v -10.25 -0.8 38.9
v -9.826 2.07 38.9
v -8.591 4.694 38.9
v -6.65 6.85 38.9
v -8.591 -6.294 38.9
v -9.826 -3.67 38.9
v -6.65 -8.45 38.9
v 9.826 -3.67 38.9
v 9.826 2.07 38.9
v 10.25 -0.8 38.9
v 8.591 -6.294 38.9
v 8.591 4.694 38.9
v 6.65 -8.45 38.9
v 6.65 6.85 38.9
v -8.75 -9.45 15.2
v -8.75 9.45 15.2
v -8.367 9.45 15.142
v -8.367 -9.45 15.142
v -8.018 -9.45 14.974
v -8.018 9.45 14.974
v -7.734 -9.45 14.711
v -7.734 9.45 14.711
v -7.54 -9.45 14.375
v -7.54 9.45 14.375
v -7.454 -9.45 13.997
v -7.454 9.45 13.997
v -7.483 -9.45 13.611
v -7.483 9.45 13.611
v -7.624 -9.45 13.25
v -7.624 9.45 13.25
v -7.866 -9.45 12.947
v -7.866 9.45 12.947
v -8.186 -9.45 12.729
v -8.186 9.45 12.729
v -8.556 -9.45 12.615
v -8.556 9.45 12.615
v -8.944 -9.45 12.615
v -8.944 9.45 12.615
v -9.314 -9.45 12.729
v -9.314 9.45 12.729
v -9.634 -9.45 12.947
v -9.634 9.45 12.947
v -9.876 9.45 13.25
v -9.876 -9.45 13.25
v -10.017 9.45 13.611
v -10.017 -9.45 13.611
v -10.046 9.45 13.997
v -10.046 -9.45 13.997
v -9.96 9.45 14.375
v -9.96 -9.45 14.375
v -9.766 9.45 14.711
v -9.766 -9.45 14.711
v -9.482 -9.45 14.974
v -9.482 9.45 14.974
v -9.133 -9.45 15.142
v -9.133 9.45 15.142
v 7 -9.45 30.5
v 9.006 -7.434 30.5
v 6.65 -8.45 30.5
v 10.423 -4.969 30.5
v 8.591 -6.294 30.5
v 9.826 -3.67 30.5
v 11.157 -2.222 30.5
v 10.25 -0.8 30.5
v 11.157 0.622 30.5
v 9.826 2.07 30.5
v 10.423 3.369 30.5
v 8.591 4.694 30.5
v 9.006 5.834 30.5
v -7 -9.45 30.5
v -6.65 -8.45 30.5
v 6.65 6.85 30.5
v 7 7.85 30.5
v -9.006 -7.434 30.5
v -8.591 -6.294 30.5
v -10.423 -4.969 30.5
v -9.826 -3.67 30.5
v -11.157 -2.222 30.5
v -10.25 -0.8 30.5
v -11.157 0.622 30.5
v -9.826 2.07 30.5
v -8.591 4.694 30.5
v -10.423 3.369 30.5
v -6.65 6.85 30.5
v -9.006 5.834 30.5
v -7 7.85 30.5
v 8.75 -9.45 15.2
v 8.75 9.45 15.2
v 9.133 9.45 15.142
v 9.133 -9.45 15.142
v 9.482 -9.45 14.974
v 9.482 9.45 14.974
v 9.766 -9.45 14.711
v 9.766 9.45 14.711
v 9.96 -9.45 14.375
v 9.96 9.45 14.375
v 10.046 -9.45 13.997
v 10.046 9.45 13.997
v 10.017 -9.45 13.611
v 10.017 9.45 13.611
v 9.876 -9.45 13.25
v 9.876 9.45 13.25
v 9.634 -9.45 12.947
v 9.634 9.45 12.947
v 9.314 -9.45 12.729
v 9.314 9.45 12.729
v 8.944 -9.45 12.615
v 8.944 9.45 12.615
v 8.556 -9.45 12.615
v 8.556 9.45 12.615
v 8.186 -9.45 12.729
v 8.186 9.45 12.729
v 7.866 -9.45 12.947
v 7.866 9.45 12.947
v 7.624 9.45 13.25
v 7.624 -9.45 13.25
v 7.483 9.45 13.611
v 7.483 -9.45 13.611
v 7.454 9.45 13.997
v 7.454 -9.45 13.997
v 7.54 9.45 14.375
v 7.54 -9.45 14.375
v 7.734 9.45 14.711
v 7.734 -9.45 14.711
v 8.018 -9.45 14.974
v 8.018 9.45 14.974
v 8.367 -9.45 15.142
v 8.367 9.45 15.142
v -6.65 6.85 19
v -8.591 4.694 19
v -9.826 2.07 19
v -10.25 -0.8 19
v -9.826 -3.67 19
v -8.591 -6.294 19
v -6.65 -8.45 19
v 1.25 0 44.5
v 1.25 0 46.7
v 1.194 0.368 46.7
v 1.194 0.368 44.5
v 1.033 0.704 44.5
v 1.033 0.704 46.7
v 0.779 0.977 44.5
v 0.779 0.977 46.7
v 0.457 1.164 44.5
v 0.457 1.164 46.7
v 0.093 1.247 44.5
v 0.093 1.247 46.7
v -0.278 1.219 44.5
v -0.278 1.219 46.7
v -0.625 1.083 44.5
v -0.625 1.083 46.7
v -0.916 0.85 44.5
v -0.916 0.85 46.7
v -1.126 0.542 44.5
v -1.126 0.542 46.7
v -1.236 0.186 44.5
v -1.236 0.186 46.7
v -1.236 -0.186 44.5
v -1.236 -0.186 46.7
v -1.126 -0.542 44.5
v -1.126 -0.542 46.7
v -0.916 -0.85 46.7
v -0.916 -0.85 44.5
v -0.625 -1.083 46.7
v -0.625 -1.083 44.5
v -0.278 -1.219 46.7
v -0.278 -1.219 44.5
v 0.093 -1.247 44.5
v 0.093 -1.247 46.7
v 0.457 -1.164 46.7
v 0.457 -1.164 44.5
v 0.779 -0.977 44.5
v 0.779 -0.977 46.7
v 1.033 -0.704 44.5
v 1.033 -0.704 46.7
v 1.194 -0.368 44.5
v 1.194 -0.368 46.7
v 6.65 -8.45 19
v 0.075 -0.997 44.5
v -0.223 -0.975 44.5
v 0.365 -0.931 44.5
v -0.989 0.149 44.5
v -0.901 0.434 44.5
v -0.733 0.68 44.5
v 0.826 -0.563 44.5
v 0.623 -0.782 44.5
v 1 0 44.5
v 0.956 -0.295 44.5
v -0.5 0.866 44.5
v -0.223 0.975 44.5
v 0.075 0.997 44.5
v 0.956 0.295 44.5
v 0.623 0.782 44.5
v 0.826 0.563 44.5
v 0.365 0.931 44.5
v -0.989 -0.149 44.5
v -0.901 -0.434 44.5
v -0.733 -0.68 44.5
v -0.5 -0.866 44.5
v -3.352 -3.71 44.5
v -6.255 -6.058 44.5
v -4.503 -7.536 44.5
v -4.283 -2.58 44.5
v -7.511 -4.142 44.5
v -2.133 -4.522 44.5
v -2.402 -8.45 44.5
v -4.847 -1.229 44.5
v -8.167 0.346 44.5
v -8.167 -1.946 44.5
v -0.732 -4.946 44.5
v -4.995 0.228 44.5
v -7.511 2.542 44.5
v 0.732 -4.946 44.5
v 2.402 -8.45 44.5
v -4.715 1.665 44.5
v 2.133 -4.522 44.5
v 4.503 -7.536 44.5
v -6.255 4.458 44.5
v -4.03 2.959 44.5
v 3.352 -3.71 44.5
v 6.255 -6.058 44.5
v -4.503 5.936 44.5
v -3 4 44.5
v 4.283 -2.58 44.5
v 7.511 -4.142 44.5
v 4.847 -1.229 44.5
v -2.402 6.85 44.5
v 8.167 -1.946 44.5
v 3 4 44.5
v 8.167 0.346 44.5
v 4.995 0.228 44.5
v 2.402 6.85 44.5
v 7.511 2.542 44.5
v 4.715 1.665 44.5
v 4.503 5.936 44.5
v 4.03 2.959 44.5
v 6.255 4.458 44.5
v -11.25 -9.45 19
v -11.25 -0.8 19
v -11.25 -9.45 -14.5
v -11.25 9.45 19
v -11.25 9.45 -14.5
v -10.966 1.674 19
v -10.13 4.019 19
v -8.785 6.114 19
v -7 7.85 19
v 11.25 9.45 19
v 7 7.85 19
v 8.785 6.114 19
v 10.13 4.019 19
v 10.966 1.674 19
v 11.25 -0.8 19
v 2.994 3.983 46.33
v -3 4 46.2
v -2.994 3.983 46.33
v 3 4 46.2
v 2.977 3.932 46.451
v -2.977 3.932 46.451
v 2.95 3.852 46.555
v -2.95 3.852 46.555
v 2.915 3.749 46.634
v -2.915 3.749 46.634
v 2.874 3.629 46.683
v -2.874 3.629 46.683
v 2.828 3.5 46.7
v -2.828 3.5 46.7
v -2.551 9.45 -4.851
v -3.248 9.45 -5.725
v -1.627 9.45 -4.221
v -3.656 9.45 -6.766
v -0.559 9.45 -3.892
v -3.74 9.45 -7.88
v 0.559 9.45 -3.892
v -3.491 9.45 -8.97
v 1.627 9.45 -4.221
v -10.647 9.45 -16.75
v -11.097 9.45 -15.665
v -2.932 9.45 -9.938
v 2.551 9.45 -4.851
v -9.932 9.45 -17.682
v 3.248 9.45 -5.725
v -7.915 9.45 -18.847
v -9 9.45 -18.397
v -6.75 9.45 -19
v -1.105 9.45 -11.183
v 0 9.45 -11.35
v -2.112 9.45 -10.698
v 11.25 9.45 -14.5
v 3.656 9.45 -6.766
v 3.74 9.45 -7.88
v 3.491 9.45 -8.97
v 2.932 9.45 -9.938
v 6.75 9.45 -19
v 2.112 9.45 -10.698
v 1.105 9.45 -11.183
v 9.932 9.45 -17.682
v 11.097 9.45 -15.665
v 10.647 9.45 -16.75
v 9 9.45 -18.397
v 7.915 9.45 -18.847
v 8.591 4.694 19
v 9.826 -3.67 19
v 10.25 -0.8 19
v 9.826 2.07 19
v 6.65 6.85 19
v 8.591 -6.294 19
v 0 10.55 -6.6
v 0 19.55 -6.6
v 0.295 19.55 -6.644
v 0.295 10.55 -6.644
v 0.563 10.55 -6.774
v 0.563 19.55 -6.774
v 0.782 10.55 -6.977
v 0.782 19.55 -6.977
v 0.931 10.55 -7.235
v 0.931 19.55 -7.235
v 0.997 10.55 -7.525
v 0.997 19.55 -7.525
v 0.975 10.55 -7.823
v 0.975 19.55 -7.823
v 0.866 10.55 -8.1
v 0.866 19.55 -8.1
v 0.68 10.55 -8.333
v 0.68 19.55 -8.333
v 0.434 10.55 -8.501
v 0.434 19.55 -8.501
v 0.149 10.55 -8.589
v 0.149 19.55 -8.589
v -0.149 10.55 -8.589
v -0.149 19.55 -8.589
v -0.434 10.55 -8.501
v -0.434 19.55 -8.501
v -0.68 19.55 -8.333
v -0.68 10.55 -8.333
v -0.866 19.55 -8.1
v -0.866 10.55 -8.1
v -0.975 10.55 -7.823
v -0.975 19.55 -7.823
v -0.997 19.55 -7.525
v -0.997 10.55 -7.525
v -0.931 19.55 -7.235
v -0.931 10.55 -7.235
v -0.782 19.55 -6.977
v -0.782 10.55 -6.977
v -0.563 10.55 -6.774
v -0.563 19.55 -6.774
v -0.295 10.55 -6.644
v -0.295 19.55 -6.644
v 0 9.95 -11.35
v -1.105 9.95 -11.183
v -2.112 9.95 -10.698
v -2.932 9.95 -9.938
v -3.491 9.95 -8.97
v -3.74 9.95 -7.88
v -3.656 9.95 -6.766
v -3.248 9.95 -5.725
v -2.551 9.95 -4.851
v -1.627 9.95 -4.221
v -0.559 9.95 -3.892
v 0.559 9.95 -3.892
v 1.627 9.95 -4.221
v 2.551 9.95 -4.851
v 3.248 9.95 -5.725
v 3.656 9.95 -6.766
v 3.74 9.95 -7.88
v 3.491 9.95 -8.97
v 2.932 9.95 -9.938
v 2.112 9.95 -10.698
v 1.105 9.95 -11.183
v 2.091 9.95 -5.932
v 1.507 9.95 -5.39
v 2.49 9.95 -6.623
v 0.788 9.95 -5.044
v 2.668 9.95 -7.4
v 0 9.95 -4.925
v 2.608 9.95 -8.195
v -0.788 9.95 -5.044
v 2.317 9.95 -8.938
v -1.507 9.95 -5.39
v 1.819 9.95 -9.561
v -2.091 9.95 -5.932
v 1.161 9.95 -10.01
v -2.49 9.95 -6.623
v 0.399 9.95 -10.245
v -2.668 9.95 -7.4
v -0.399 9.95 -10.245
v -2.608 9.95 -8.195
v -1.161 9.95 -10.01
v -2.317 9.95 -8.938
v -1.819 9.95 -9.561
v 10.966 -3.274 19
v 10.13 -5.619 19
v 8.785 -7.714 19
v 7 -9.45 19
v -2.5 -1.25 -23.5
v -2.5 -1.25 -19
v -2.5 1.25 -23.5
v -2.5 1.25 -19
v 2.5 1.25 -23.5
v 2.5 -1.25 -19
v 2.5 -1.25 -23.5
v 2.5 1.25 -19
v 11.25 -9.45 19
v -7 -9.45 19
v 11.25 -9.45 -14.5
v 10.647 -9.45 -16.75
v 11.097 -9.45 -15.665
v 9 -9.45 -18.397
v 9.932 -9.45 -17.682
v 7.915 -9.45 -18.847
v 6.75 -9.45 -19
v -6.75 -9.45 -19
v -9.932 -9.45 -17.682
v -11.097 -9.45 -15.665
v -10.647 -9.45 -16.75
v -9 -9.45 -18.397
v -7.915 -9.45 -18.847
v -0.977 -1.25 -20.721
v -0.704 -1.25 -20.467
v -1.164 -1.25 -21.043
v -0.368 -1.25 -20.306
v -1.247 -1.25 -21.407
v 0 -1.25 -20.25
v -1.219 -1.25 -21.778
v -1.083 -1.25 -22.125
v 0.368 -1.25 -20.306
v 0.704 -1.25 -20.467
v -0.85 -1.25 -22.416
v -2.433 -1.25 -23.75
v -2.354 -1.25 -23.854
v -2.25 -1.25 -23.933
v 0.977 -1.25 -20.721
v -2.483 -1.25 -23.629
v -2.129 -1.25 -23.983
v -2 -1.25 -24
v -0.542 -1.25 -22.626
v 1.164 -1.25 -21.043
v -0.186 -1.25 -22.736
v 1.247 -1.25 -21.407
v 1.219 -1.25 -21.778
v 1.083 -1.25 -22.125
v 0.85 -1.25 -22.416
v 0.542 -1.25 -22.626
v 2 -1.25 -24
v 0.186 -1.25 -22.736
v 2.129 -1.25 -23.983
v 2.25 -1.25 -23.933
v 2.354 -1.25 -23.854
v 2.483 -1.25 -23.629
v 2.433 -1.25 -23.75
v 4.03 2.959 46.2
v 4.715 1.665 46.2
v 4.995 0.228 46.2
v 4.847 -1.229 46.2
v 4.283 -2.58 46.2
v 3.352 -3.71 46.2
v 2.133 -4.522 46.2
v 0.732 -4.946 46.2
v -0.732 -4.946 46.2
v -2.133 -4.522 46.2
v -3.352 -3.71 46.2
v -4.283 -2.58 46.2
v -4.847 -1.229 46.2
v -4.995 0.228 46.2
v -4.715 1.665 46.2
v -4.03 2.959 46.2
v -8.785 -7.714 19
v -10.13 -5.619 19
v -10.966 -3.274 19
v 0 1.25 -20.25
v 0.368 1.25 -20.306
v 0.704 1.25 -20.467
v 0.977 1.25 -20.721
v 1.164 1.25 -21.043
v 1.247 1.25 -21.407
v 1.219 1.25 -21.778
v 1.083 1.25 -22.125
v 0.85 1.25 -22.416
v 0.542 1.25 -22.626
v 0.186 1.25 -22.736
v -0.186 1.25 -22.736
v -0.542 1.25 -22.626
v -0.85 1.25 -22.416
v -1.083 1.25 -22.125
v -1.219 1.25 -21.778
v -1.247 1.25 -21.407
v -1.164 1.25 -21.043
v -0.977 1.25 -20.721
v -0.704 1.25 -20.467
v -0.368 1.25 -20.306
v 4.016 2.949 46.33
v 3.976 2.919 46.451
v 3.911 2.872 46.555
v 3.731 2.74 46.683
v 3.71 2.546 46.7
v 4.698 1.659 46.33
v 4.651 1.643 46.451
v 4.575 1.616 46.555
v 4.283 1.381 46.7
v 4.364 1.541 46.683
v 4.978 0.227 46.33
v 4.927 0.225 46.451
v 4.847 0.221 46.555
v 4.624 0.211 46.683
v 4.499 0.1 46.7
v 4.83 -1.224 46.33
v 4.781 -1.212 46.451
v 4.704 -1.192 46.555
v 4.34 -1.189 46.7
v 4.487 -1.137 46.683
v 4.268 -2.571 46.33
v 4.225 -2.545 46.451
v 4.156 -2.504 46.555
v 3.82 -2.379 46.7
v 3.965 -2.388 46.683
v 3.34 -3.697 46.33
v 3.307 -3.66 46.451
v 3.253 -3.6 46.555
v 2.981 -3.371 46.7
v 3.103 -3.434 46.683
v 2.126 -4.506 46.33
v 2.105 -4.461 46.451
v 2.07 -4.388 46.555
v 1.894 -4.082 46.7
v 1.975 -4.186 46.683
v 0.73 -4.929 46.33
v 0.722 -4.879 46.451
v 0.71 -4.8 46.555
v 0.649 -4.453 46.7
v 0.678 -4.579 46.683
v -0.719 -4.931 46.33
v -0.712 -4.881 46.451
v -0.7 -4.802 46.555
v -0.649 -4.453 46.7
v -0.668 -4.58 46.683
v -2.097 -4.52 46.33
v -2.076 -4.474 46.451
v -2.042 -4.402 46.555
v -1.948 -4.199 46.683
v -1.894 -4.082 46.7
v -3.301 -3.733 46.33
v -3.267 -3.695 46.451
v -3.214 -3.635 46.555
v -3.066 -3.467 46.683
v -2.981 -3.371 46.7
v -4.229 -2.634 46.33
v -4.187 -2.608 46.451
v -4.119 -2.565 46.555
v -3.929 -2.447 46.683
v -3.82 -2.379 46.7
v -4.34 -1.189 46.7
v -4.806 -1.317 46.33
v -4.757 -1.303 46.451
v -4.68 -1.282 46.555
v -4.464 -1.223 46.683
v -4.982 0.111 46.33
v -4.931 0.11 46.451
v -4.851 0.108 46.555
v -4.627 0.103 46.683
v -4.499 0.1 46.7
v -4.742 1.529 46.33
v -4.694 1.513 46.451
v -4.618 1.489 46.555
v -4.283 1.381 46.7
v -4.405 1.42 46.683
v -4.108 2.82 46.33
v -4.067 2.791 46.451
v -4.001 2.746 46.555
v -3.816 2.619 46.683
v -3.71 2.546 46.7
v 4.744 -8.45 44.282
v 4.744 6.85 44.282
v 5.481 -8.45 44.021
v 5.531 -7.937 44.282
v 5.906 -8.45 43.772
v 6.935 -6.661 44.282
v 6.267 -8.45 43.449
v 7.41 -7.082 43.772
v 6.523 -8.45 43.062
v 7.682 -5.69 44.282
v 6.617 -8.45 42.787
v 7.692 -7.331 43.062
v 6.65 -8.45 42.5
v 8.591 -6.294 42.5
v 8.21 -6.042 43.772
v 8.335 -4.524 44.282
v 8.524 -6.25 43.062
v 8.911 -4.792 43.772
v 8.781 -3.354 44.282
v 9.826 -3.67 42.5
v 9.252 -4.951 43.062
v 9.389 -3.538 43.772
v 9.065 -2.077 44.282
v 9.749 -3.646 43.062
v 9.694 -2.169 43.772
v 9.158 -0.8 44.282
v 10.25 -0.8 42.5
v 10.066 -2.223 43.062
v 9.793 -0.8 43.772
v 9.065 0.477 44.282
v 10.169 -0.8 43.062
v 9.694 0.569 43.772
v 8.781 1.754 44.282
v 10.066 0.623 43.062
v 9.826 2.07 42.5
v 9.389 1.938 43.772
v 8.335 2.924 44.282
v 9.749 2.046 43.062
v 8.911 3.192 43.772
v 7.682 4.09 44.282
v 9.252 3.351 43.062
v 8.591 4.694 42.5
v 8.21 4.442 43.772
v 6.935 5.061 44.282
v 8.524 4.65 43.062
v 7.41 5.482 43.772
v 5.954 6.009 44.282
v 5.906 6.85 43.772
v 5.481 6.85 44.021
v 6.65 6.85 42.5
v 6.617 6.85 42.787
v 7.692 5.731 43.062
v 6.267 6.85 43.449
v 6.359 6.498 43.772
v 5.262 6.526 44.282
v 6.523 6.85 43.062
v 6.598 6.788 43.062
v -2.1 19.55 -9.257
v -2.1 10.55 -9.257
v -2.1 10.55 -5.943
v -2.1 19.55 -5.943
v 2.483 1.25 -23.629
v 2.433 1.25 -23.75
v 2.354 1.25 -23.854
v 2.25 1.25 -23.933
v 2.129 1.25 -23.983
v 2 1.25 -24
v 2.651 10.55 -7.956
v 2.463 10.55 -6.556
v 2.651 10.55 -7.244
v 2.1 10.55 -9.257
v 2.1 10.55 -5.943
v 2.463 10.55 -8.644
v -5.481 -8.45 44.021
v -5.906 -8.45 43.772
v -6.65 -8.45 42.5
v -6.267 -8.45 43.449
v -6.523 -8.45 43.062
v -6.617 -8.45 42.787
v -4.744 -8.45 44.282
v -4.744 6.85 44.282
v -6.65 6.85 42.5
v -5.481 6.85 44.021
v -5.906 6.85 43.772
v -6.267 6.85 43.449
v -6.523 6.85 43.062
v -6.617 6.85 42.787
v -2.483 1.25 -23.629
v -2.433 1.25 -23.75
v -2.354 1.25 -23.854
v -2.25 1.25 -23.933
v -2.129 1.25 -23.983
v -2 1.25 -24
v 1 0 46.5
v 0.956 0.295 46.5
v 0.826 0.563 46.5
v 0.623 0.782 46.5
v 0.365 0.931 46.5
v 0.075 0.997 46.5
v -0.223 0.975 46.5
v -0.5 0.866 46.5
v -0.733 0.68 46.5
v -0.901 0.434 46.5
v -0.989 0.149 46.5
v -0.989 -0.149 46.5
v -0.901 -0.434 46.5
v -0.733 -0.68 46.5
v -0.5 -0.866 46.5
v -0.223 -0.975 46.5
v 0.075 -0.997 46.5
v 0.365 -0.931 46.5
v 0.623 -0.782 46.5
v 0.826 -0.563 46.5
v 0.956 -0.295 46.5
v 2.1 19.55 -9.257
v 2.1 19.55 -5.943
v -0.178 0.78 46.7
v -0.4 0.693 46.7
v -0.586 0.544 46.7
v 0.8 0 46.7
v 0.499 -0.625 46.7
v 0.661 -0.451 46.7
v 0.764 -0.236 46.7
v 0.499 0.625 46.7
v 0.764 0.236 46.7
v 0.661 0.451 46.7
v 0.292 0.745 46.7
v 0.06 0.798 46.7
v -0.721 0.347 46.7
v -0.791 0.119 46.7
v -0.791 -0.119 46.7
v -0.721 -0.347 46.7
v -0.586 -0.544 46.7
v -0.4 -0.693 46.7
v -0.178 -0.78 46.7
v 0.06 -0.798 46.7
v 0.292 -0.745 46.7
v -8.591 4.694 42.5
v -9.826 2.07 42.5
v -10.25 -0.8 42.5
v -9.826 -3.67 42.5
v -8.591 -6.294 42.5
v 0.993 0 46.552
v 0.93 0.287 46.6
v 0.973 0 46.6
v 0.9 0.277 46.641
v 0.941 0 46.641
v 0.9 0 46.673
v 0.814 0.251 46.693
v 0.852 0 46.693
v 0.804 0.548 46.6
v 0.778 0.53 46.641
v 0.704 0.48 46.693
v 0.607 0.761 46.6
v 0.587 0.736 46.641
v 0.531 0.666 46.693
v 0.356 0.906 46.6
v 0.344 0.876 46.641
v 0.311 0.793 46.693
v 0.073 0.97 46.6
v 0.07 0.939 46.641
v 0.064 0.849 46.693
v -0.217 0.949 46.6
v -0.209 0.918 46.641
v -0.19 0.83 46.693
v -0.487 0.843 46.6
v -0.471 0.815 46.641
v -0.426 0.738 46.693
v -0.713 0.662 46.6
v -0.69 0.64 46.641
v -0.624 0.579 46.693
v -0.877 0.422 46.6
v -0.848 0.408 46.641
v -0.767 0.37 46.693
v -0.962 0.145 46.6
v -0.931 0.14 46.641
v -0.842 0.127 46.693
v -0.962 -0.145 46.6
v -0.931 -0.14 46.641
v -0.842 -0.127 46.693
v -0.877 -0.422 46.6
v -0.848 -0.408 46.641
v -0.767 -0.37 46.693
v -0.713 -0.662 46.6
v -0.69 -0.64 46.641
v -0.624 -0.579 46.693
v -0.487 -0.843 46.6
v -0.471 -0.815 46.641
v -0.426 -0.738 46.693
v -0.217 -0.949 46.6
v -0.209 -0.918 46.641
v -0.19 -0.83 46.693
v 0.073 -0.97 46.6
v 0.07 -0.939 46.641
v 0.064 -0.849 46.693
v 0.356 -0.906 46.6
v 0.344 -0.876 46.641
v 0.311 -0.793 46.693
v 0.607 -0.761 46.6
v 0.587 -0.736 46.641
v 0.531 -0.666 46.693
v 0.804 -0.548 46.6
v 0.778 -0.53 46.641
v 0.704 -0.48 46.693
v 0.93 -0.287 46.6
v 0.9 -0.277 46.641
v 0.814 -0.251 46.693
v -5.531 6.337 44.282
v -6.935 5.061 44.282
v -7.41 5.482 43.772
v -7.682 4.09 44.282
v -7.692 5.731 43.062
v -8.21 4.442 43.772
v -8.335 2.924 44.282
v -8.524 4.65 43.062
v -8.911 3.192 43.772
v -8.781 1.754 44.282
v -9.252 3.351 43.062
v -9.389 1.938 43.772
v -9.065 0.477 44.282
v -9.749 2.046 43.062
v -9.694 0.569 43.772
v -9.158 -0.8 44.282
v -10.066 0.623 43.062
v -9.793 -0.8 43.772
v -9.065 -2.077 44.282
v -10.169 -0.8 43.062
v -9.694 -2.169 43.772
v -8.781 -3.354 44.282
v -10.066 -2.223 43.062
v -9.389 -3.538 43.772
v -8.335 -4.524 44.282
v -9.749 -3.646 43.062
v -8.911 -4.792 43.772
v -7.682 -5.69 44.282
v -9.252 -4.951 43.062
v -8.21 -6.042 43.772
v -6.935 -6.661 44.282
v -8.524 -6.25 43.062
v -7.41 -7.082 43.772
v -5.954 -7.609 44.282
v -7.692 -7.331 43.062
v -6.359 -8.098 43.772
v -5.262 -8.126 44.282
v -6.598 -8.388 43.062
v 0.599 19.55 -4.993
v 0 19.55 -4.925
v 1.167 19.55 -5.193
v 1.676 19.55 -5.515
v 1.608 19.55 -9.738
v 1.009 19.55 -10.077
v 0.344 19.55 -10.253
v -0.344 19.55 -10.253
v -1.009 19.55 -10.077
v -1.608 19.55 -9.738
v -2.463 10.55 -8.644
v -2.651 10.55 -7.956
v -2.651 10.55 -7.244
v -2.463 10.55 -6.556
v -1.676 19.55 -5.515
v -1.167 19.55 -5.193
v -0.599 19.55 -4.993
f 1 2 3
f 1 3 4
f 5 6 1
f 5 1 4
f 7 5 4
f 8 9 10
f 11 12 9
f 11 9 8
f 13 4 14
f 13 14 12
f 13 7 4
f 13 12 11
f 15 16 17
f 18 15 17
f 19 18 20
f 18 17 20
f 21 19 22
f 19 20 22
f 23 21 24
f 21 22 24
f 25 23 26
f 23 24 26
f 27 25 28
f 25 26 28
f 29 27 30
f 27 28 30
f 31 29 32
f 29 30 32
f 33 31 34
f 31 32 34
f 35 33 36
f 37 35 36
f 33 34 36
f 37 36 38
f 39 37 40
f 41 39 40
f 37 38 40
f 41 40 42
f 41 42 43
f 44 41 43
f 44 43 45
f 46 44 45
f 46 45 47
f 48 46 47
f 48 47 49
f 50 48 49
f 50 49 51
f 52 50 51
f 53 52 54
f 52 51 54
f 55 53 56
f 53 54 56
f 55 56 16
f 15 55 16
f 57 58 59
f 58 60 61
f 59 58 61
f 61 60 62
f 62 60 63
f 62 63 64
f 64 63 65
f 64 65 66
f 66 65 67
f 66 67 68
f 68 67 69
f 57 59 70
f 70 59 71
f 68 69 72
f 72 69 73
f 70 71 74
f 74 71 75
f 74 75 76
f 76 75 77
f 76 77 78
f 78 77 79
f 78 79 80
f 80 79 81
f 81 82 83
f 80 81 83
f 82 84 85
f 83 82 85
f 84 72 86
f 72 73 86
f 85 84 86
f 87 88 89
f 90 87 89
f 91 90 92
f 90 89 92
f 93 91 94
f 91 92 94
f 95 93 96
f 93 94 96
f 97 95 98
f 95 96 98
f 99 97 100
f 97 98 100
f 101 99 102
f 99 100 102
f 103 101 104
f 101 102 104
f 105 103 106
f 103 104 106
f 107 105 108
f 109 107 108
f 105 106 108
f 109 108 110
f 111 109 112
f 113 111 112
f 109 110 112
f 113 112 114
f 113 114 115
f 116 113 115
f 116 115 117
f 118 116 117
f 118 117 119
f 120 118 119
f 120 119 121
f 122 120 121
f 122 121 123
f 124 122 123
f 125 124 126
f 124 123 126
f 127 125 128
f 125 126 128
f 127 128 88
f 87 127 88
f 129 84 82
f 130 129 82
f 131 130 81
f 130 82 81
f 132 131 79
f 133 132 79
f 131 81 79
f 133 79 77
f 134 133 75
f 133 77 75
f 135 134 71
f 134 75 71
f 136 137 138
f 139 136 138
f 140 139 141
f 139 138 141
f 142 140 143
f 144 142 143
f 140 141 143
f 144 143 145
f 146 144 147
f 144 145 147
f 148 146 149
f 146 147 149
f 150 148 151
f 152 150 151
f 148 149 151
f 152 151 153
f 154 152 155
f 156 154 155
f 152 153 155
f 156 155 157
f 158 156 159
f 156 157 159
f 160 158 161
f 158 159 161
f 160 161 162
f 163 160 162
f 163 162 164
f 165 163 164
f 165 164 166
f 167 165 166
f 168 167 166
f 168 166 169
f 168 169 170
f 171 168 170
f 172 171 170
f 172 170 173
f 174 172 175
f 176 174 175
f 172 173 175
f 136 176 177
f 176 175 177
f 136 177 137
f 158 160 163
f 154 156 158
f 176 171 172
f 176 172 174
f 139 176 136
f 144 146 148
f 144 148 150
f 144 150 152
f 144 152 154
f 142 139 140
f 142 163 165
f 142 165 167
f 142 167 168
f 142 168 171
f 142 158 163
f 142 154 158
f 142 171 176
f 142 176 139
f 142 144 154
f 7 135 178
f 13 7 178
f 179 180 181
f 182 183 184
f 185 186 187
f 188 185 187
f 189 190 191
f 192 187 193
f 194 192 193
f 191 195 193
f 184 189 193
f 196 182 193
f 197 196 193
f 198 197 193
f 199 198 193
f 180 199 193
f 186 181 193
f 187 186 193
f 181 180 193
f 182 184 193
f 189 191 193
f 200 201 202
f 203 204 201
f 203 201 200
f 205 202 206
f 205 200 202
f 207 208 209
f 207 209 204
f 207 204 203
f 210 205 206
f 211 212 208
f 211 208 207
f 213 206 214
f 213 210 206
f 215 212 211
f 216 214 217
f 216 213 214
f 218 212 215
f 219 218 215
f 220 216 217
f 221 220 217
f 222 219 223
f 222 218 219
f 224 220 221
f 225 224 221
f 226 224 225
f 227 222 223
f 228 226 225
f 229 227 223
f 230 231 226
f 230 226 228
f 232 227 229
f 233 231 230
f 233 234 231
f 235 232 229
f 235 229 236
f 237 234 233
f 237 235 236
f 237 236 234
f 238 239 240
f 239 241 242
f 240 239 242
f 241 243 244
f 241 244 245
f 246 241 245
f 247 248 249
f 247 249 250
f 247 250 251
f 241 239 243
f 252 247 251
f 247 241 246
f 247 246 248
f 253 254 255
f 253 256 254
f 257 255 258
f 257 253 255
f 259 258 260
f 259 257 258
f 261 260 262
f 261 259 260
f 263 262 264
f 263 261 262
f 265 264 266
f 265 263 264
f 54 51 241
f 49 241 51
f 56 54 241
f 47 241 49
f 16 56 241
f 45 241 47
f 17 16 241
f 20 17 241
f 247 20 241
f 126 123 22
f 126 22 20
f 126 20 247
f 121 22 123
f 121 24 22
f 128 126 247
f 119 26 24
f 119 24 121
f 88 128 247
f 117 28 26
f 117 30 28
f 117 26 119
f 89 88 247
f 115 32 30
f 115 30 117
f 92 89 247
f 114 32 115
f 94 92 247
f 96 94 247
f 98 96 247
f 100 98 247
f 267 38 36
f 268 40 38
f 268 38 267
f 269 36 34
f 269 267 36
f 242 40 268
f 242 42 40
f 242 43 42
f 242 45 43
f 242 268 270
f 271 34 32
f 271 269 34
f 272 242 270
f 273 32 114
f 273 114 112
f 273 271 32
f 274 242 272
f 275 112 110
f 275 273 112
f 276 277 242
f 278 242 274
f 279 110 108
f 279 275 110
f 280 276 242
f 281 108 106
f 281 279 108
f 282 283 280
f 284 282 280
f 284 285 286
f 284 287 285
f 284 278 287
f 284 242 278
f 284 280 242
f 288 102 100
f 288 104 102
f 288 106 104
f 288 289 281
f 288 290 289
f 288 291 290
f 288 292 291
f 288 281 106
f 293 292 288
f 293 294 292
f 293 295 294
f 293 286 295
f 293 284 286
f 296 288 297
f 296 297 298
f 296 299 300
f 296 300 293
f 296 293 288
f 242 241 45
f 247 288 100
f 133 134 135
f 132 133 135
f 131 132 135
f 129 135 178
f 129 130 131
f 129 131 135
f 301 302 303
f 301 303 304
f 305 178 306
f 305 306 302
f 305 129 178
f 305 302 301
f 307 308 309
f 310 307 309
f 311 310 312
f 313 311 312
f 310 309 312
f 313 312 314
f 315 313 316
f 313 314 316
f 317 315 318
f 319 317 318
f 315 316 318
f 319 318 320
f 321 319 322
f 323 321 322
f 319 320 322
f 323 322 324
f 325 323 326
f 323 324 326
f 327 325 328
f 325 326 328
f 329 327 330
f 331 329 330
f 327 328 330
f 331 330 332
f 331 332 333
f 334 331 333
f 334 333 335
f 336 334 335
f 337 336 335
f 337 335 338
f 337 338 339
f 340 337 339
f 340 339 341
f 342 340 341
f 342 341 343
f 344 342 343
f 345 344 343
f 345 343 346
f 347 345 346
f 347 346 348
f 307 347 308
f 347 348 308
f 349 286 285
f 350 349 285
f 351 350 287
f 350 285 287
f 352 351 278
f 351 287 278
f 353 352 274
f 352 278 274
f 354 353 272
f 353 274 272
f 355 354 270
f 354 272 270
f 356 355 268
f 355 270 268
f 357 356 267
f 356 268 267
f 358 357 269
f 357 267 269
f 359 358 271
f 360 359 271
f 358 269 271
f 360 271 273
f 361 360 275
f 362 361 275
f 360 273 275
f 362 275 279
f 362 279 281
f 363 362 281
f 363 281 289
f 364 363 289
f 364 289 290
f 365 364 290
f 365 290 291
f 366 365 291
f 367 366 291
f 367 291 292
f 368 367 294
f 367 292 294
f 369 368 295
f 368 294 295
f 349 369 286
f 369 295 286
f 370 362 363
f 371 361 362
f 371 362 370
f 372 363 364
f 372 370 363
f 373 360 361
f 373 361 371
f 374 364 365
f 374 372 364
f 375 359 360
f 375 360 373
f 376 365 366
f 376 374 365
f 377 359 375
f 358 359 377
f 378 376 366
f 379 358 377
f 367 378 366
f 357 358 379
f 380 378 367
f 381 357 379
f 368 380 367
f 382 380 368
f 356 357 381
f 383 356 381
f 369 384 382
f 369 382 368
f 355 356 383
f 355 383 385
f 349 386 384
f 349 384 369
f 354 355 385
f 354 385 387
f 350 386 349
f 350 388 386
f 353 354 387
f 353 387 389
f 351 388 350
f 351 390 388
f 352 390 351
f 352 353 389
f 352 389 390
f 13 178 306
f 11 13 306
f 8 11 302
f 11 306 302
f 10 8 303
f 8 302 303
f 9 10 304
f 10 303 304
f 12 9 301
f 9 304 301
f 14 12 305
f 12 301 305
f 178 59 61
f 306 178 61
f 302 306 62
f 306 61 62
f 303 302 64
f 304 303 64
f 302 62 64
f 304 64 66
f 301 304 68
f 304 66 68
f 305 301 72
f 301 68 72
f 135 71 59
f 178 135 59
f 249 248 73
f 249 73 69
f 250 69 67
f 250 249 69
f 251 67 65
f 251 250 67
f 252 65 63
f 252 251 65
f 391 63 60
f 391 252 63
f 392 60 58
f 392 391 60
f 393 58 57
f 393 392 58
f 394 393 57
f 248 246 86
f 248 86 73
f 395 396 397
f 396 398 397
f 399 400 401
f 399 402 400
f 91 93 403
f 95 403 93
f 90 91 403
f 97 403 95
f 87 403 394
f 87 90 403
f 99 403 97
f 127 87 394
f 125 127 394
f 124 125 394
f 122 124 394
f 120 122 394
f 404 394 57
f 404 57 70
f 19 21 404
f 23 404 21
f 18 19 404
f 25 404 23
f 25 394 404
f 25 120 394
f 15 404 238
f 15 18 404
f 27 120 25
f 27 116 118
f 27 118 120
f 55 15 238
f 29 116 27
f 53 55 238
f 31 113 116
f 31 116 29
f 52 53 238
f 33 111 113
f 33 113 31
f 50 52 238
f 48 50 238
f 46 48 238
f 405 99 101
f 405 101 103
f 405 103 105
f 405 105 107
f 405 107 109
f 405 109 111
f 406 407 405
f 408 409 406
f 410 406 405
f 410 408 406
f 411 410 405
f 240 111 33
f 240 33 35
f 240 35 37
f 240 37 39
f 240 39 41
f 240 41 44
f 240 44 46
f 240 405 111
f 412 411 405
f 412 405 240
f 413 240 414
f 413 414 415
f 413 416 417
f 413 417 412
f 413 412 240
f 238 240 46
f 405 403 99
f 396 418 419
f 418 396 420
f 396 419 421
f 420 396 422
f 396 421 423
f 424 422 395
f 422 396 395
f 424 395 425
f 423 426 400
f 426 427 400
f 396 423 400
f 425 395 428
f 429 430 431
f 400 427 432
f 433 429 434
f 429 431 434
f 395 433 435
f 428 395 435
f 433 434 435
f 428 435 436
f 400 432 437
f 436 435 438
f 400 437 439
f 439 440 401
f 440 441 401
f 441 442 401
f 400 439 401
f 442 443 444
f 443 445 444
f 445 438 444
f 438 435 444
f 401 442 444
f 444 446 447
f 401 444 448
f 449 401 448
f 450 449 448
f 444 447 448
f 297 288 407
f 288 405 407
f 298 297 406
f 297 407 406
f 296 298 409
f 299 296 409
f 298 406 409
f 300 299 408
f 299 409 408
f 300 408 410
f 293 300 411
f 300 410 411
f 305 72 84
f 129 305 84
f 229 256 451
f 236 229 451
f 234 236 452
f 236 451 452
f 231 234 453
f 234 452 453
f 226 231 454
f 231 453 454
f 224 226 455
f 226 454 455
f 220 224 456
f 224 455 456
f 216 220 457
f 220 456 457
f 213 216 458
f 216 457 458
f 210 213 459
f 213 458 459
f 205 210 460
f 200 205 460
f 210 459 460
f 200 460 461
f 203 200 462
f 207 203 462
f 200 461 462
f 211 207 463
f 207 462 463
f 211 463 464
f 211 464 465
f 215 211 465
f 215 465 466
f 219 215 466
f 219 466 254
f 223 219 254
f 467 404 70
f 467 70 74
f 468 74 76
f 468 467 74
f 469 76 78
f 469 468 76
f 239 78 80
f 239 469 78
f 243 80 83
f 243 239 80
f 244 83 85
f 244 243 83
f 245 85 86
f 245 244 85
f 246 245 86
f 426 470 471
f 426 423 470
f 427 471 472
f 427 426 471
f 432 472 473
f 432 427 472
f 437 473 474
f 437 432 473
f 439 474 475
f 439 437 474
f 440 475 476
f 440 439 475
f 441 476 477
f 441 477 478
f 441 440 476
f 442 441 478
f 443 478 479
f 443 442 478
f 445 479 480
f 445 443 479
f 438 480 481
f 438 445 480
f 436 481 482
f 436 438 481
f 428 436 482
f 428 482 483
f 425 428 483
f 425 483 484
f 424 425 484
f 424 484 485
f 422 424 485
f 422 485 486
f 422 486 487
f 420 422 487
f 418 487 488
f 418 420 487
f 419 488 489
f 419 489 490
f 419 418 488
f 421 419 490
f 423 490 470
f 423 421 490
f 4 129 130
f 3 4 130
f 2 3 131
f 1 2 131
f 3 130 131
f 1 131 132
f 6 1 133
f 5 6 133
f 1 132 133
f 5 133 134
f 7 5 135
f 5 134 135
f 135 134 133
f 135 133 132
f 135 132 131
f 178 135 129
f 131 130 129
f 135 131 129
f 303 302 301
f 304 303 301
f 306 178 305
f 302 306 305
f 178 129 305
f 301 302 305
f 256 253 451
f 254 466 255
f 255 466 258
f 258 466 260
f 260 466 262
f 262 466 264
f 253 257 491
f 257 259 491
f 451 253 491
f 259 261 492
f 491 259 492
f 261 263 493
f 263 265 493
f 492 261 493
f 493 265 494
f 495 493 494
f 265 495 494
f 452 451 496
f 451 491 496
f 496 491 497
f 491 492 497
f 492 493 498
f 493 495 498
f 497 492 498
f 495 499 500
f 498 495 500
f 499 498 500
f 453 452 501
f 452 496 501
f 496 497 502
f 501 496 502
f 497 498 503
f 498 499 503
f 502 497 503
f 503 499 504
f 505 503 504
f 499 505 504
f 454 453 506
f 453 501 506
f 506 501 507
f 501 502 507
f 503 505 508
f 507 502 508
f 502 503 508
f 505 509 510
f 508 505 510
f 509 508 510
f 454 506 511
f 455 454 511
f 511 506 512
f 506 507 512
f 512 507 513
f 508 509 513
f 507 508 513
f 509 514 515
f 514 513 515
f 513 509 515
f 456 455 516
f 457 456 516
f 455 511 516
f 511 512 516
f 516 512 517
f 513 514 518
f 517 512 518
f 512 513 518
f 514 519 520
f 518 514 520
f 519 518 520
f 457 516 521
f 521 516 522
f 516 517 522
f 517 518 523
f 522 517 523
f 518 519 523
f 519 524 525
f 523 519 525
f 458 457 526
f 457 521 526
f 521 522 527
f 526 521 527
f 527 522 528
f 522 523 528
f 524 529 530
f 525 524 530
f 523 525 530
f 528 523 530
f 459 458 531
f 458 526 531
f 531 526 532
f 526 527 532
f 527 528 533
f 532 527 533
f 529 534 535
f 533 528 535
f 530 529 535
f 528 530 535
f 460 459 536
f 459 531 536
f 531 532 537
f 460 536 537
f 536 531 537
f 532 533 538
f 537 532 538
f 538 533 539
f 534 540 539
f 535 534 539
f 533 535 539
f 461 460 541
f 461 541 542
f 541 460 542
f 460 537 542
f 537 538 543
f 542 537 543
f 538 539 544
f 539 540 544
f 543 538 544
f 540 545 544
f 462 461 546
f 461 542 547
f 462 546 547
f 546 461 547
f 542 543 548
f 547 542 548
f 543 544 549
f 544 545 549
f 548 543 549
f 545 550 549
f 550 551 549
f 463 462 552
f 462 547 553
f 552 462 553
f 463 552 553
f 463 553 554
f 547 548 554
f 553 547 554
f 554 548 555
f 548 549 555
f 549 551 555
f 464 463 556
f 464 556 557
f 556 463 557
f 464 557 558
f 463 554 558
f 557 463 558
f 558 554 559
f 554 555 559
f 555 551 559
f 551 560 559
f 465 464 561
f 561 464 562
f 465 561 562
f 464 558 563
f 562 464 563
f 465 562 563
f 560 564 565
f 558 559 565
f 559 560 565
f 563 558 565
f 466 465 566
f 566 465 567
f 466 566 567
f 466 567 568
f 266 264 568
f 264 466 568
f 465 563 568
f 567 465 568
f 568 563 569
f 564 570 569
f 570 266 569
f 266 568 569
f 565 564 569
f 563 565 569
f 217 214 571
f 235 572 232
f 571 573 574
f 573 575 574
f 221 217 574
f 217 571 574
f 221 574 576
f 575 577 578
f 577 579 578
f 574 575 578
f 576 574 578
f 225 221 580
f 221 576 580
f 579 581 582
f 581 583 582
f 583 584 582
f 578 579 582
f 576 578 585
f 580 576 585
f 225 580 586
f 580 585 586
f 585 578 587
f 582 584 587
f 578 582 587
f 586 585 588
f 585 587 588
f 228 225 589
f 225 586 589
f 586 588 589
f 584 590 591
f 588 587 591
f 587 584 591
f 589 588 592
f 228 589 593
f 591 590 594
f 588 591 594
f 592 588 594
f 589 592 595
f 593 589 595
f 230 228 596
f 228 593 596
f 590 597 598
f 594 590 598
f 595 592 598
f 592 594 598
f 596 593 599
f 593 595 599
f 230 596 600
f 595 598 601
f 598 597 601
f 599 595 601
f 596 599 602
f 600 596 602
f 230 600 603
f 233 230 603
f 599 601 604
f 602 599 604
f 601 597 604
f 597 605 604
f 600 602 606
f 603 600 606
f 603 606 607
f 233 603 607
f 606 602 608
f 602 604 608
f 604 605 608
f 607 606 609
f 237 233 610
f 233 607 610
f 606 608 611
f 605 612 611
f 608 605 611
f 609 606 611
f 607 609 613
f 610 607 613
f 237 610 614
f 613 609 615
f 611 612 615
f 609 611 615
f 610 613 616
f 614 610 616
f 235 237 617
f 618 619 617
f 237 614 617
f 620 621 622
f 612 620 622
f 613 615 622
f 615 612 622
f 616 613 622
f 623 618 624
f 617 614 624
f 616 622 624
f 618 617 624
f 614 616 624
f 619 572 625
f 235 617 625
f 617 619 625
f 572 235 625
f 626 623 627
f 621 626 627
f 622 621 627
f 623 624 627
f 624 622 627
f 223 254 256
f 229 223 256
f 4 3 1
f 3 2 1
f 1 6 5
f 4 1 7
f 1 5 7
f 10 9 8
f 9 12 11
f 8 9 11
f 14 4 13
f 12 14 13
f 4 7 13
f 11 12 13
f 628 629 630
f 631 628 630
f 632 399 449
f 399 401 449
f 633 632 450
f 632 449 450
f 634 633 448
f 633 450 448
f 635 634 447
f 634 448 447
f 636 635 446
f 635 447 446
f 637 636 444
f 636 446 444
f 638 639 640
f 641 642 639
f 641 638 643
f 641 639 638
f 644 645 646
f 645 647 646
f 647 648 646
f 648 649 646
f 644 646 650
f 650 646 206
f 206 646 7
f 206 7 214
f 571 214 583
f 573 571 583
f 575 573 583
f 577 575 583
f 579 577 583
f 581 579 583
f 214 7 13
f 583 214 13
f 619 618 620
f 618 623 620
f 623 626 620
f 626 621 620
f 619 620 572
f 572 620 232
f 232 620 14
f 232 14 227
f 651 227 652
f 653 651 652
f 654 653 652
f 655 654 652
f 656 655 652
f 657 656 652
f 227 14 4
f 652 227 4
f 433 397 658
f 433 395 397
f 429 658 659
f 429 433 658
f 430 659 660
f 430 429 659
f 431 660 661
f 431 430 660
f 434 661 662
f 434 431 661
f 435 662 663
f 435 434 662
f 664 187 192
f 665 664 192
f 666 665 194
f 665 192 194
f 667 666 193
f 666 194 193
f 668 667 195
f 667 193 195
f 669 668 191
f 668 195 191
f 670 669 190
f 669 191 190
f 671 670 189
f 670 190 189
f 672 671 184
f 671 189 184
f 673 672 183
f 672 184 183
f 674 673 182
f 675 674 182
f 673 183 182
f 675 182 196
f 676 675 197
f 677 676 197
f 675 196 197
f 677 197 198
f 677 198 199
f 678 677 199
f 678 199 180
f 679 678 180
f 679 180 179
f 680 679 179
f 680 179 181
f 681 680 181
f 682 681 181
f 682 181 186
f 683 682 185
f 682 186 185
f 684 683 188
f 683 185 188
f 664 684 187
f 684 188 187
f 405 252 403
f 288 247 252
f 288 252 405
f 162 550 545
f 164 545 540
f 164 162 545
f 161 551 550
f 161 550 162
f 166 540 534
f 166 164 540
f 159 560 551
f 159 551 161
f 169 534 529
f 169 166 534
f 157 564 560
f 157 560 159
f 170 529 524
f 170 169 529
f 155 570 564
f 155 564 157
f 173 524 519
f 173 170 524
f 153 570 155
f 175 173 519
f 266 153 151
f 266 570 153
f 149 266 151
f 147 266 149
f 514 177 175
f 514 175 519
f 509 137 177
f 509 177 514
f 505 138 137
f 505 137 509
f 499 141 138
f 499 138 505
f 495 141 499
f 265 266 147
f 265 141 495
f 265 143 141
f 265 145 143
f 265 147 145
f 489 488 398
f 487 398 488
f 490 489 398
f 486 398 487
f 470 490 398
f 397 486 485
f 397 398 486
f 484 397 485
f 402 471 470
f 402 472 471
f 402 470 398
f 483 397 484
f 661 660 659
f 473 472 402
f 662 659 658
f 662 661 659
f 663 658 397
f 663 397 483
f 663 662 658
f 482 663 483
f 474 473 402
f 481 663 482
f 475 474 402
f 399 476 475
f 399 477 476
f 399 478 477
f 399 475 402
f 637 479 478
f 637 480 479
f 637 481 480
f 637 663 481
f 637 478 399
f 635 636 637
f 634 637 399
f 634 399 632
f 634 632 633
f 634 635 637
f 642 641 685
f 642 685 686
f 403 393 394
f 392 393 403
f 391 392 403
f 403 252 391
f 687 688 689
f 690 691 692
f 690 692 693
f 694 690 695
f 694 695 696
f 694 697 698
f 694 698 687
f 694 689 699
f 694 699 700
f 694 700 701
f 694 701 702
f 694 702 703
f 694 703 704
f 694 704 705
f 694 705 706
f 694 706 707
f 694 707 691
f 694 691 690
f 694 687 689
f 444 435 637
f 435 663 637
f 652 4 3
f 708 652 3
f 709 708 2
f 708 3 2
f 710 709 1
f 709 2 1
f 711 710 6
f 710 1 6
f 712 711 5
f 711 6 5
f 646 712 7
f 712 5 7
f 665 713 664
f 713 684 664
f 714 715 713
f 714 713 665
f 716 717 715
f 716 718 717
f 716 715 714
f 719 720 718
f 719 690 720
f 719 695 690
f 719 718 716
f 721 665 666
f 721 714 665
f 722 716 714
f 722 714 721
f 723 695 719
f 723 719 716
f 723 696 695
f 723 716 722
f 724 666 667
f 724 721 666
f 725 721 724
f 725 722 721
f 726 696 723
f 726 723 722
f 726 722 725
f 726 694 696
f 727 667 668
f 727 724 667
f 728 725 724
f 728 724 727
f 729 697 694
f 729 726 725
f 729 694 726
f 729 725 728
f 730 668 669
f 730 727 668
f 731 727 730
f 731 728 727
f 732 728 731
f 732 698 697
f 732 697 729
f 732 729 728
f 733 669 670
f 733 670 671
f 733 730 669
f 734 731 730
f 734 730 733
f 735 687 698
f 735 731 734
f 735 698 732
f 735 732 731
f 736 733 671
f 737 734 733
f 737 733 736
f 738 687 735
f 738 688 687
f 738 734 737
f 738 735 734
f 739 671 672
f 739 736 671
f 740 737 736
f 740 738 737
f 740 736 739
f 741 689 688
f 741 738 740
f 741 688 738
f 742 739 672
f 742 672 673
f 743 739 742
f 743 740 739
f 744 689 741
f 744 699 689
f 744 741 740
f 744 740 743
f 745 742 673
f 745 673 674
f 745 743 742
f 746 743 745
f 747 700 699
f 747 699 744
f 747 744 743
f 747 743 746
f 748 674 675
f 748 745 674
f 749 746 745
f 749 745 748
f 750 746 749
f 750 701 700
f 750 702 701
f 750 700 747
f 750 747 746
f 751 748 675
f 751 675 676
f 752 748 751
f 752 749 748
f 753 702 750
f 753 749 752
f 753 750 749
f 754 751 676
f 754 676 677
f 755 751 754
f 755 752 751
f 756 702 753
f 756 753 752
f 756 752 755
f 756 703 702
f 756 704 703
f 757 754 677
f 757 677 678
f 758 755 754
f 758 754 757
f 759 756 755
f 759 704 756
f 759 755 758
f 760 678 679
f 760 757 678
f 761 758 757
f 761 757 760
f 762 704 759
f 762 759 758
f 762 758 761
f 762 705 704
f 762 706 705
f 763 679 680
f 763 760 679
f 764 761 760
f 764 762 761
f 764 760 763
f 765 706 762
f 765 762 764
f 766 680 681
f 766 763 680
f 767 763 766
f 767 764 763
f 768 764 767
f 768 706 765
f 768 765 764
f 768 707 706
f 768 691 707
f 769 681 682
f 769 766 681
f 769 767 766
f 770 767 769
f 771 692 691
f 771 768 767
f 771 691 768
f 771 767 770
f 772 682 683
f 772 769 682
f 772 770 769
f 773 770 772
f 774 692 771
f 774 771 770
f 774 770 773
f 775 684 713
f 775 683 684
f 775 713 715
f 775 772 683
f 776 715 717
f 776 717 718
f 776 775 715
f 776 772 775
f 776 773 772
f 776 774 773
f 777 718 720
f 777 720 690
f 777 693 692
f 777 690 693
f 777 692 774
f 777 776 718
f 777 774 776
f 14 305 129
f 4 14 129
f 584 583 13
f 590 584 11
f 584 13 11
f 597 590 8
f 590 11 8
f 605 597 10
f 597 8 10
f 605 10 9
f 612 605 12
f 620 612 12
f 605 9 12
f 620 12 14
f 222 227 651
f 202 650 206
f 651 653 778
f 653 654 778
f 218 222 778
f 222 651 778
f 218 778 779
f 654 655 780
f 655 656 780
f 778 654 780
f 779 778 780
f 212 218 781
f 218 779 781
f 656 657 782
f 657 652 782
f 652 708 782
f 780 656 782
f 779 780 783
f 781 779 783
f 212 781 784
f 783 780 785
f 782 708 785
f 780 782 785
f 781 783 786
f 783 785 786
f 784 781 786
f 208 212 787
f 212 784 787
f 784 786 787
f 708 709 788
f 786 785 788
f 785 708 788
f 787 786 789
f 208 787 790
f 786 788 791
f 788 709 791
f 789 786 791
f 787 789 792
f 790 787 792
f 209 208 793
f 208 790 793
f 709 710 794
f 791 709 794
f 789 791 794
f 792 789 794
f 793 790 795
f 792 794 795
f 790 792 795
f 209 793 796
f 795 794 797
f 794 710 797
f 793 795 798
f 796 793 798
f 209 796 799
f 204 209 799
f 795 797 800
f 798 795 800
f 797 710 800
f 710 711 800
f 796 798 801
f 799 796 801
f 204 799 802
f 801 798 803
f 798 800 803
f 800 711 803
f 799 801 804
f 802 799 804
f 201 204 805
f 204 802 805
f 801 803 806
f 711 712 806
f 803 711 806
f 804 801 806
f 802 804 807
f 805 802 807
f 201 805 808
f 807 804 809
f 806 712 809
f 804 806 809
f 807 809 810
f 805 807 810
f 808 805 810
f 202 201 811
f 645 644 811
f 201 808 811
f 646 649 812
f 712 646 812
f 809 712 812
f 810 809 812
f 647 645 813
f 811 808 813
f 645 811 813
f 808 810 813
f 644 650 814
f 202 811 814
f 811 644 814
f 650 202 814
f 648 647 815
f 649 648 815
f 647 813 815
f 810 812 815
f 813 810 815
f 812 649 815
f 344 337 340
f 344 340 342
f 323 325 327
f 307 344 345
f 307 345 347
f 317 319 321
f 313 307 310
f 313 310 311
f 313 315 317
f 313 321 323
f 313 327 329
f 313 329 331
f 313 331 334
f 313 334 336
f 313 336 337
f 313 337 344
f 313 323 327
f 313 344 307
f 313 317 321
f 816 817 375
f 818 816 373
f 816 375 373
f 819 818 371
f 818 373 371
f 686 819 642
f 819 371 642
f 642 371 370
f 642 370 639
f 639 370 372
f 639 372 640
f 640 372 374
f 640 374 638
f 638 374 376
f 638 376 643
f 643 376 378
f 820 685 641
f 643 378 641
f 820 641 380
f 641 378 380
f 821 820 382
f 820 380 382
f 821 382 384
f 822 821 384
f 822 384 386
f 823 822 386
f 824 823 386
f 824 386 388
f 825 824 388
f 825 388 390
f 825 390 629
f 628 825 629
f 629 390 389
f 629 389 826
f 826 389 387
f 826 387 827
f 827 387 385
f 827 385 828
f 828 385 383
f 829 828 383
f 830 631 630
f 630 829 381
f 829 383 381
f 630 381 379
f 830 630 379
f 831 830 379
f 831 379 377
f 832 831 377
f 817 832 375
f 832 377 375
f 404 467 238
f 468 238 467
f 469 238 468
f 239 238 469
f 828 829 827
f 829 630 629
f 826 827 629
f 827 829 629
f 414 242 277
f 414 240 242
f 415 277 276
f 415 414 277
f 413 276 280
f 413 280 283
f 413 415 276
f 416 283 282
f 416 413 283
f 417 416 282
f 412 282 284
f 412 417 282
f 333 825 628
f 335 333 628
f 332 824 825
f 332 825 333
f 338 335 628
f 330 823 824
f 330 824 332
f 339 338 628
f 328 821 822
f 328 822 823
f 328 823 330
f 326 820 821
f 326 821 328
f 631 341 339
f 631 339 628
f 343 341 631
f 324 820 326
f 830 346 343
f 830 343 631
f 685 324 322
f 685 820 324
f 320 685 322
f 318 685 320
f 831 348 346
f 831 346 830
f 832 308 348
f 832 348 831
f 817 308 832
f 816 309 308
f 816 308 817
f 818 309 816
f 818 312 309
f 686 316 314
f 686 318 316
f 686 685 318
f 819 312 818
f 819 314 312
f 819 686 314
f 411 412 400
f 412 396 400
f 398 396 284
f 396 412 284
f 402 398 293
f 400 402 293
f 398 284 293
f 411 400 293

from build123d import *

# Parameters (mm, degrees)
SKETCH1_W              = 22.5
SKETCH1_H              = 38
BOSS_EXTRUDE1_DEPTH    = 9.45
FILLET1_R              = 4.5
BOSS_EXTRUDE2_DEPTH    = 11.5
CUT_EXTRUDE1_DEPTH     = 11.5
SKETCH4_W              = 5
SKETCH4_H              = 5
SKETCH4_R              = 1.25
BOSS_EXTRUDE3_DEPTH    = 1.25
SKETCH5_R              = 3.75
BOSS_EXTRUDE4_DEPTH    = 0.5
SKETCH6_R              = 2.675
BOSS_EXTRUDE5_DEPTH    = 9.6
CUT_EXTRUDE4_START     = -9
CUT_EXTRUDE4_DEPTH     = 9
SKETCH8_R              = 1
CUT_EXTRUDE5_DEPTH     = 9
FILLET2_R              = 0.5
BOSS_EXTRUDE6_DEPTH    = 27.7
SPLIT1_SURFACE_1_BACK  = 80.66
SPLIT1_SURFACE_1_DEPTH = 161.32
SPLIT1_SURFACE_2_BACK  = 80.66
SPLIT1_SURFACE_2_DEPTH = 161.32
CUT_EXTRUDE6_DEPTH     = 2.2
FILLET4_R              = 0.5
FILLET3_R              = 2
SKETCH12_R             = 1.25
CUT_EXTRUDE7_DEPTH     = 2.2
SKETCH13_R             = 1
BOSS_EXTRUDE7_DEPTH    = 2.2
FILLET5_R              = 0.2
SKETCH14_R             = 1.3
CUT_EXTRUDE8_DEPTH     = 18.9


with BuildPart() as part:
    # Sketch1 → Boss-Extrude1 (new, symmetric)
    with BuildSketch(Plane(origin=(0, 0, 0), x_dir=(1, 0, 0), z_dir=(0, 1, 0))):
        Rectangle(SKETCH1_W, SKETCH1_H)
    extrude(amount=BOSS_EXTRUDE1_DEPTH, both=True)

    # Fillet1
    fillet1_edges = [part.edges().sort_by_distance(p)[0] for p in [
        (-11.25, 0, -19),
        (11.25, 0, -19),
    ]]
    fillet(fillet1_edges, radius=FILLET1_R)

    # Sketch2 → Boss-Extrude2 (add)
    with BuildSketch(Plane.XY.offset(19)):
        with BuildLine():
            Line((7, -9.45), (-7, -9.45))
            ThreePointArc((-7, -9.45), (-11.25, -0.8), (-7, 7.85))
            Line((-7, 7.85), (7, 7.85))
            ThreePointArc((7, 7.85), (11.25, -0.8), (7, -9.45))
        make_face()
    extrude(amount=BOSS_EXTRUDE2_DEPTH)

    # Sketch3 → Cut-Extrude1 (cut)
    with BuildSketch(Plane.XY.offset(30.5)):
        with BuildLine():
            Line((-6.649728078, -8.45), (6.649728078, -8.45))
            ThreePointArc((6.649728078, -8.45), (10.25, -0.8), (6.649728078, 6.85))
            Line((6.649728078, 6.85), (-6.649728078, 6.85))
            ThreePointArc((-6.649728078, 6.85), (-10.25, -0.8), (-6.649728078, -8.45))
        make_face()
    extrude(amount=-CUT_EXTRUDE1_DEPTH, mode=Mode.SUBTRACT)

    # Sketch4 → Boss-Extrude3 (add, symmetric)
    with BuildSketch(Plane(origin=(0, 0, 0), x_dir=(1, 0, 0), z_dir=(0, 1, 0))):
        with Locations((0, 21.5)):
            Rectangle(SKETCH4_W, SKETCH4_H)
        with Locations(Location((0, 21.5, 0), (0, 0, 270))):
            Circle(SKETCH4_R, mode=Mode.SUBTRACT)
    extrude(amount=BOSS_EXTRUDE3_DEPTH, both=True)

    # Sketch5 → Boss-Extrude4 (add)
    with BuildSketch(Plane(origin=(0, 9.45, 0), x_dir=(1, 0, 0), z_dir=(0, 1, 0))):
        with Locations(Location((0, 7.6, 0), (0, 0, 90))):
            Circle(SKETCH5_R)
    extrude(amount=BOSS_EXTRUDE4_DEPTH)

    # Sketch6 → Boss-Extrude5 (add)
    with BuildSketch(Plane(origin=(0, 9.95, 0), x_dir=(1, 0, 0), z_dir=(0, 1, 0))):
        with Locations(Location((0, 7.6, 0), (0, 0, 270))):
            Circle(SKETCH6_R)
    extrude(amount=BOSS_EXTRUDE5_DEPTH)

    # Sketch7 → Cut-Extrude4 (cut)
    with BuildSketch(Plane(origin=(0, 19.55, 0), x_dir=(1, 0, 0), z_dir=(0, 1, 0)).offset(CUT_EXTRUDE4_START)):
        with BuildLine():
            Line((-2.1, 9.256992758), (-2.1, 5.943007242))
            ThreePointArc((-2.1, 5.943007242), (-2.675, 7.6), (-2.1, 9.256992758))
        make_face()
        with BuildLine():
            Line((2.1, 9.256992758), (2.1, 5.943007242))
            ThreePointArc((2.1, 5.943007242), (2.675, 7.6), (2.1, 9.256992758))
        make_face()
    extrude(amount=CUT_EXTRUDE4_DEPTH, mode=Mode.SUBTRACT)

    # Sketch8 → Cut-Extrude5 (cut)
    with BuildSketch(Plane(origin=(0, 19.55, 0), x_dir=(1, 0, 0), z_dir=(0, 1, 0))):
        with Locations(Location((0, 7.6, 0), (0, 0, 270))):
            Circle(SKETCH8_R)
    extrude(amount=-CUT_EXTRUDE5_DEPTH, mode=Mode.SUBTRACT)

    # Fillet2
    fillet2_edges = [part.edges().sort_by_distance(p)[0] for p in [
        (-2.5, 0, -24),
        (2.5, 0, -24),
    ]]
    fillet(fillet2_edges, radius=FILLET2_R)

    # Sketch14 → Cut-Extrude8 (cut)
    with BuildSketch(Plane(origin=(0, 9.45, 0), x_dir=(1, 0, 0), z_dir=(0, 1, 0))):
        with Locations(Location((-8.75, -13.9, 0), (0, 0, 270))):
            Circle(SKETCH14_R)
        with Locations(Location((8.75, -13.9, 0), (0, 0, 270))):
            Circle(SKETCH14_R)
    extrude(amount=-CUT_EXTRUDE8_DEPTH, mode=Mode.SUBTRACT)


with BuildPart() as body_2:
    # Sketch9 → Boss-Extrude6 (new body)
    with BuildSketch(Plane.XY.offset(19)):
        with BuildLine():
            Line((-6.649728078, -8.45), (6.649728078, -8.45))
            ThreePointArc((6.649728078, -8.45), (10.25, -0.8), (6.649728078, 6.85))
            Line((6.649728078, 6.85), (-6.649728078, 6.85))
            ThreePointArc((-6.649728078, 6.85), (-10.25, -0.8), (-6.649728078, -8.45))
        make_face()
    extrude(amount=BOSS_EXTRUDE6_DEPTH)


with BuildPart() as body_3:
    # Split1: the piece behind the surface
    add(body_2.part)
    # Split1 surface: a surface, the sketch's curves swept straight by 161.32 mm
    with BuildLine(Plane(origin=(0, 6.85, 0), x_dir=(1, 0, 0), z_dir=(0, 1, 0)).offset(-SPLIT1_SURFACE_1_BACK), mode=Mode.PRIVATE) as split1_surface_1_path:
        Line((-10.25, -38.9), (10.25, -38.9))
    split1_surface_1 = Shell.extrude(split1_surface_1_path.wire(), (0 * SPLIT1_SURFACE_1_DEPTH, 1 * SPLIT1_SURFACE_1_DEPTH, 0 * SPLIT1_SURFACE_1_DEPTH))
    split(bisect_by=split1_surface_1, keep=Keep.BOTTOM)

    # Sketch11 → Cut-Extrude6 (cut)
    with BuildSketch(Plane.XY.offset(46.7)):
        with BuildLine():
            Line((-6.649728078, -8.45), (6.649728078, -8.45))
            ThreePointArc((6.649728078, -8.45), (10.25, -0.8), (6.649728078, 6.85))
            Line((6.649728078, 6.85), (-6.649728078, 6.85))
            ThreePointArc((-6.649728078, 6.85), (-10.25, -0.8), (-6.649728078, -8.45))
        make_face()
        with BuildLine():
            Line((-3, 4), (3, 4))
            ThreePointArc((3, 4), (0, -5), (-3, 4))
        make_face(mode=Mode.SUBTRACT)
    extrude(amount=-CUT_EXTRUDE6_DEPTH, mode=Mode.SUBTRACT)

    # Fillet4
    fillet4_edges = [body_3.edges().sort_by_distance(p)[0] for p in [
        (0, -5, 46.7),
        (0, 4, 46.7),
    ]]
    fillet(fillet4_edges, radius=FILLET4_R)

    # Fillet3
    fillet3_edges = [body_3.edges().sort_by_distance(p)[0] for p in [
        (-10.25, -0.8, 44.5),
        (10.25, -0.8, 44.5),
    ]]
    fillet(fillet3_edges, radius=FILLET3_R)

    # Sketch12 → Cut-Extrude7 (cut)
    with BuildSketch(Plane.XY.offset(46.7)):
        Circle(SKETCH12_R)
    extrude(amount=-CUT_EXTRUDE7_DEPTH, mode=Mode.SUBTRACT)


with BuildPart() as body_2_1:
    add(body_2.part)

    # Split1: split by a surface, the side it looks to stays
    # Split1 surface: a surface, the sketch's curves swept straight by 161.32 mm
    with BuildLine(Plane(origin=(0, 6.85, 0), x_dir=(1, 0, 0), z_dir=(0, 1, 0)).offset(-SPLIT1_SURFACE_2_BACK), mode=Mode.PRIVATE) as split1_surface_2_path:
        Line((-10.25, -38.9), (10.25, -38.9))
    split1_surface_2 = Shell.extrude(split1_surface_2_path.wire(), (0 * SPLIT1_SURFACE_2_DEPTH, 1 * SPLIT1_SURFACE_2_DEPTH, 0 * SPLIT1_SURFACE_2_DEPTH))
    split(bisect_by=split1_surface_2, keep=Keep.TOP)


with BuildPart() as body_4:
    # Sketch13 → Boss-Extrude7 (new body)
    with BuildSketch(Plane.XY.offset(44.5)):
        Circle(SKETCH13_R)
    extrude(amount=BOSS_EXTRUDE7_DEPTH)

    # Fillet5
    fillet5_edges = [body_4.edges().sort_by_distance(p)[0] for p in [
        (-1, 0, 46.7),
    ]]
    fillet(fillet5_edges, radius=FILLET5_R)


solid = Compound([part.part, body_3.part, body_2_1.part, body_4.part])
